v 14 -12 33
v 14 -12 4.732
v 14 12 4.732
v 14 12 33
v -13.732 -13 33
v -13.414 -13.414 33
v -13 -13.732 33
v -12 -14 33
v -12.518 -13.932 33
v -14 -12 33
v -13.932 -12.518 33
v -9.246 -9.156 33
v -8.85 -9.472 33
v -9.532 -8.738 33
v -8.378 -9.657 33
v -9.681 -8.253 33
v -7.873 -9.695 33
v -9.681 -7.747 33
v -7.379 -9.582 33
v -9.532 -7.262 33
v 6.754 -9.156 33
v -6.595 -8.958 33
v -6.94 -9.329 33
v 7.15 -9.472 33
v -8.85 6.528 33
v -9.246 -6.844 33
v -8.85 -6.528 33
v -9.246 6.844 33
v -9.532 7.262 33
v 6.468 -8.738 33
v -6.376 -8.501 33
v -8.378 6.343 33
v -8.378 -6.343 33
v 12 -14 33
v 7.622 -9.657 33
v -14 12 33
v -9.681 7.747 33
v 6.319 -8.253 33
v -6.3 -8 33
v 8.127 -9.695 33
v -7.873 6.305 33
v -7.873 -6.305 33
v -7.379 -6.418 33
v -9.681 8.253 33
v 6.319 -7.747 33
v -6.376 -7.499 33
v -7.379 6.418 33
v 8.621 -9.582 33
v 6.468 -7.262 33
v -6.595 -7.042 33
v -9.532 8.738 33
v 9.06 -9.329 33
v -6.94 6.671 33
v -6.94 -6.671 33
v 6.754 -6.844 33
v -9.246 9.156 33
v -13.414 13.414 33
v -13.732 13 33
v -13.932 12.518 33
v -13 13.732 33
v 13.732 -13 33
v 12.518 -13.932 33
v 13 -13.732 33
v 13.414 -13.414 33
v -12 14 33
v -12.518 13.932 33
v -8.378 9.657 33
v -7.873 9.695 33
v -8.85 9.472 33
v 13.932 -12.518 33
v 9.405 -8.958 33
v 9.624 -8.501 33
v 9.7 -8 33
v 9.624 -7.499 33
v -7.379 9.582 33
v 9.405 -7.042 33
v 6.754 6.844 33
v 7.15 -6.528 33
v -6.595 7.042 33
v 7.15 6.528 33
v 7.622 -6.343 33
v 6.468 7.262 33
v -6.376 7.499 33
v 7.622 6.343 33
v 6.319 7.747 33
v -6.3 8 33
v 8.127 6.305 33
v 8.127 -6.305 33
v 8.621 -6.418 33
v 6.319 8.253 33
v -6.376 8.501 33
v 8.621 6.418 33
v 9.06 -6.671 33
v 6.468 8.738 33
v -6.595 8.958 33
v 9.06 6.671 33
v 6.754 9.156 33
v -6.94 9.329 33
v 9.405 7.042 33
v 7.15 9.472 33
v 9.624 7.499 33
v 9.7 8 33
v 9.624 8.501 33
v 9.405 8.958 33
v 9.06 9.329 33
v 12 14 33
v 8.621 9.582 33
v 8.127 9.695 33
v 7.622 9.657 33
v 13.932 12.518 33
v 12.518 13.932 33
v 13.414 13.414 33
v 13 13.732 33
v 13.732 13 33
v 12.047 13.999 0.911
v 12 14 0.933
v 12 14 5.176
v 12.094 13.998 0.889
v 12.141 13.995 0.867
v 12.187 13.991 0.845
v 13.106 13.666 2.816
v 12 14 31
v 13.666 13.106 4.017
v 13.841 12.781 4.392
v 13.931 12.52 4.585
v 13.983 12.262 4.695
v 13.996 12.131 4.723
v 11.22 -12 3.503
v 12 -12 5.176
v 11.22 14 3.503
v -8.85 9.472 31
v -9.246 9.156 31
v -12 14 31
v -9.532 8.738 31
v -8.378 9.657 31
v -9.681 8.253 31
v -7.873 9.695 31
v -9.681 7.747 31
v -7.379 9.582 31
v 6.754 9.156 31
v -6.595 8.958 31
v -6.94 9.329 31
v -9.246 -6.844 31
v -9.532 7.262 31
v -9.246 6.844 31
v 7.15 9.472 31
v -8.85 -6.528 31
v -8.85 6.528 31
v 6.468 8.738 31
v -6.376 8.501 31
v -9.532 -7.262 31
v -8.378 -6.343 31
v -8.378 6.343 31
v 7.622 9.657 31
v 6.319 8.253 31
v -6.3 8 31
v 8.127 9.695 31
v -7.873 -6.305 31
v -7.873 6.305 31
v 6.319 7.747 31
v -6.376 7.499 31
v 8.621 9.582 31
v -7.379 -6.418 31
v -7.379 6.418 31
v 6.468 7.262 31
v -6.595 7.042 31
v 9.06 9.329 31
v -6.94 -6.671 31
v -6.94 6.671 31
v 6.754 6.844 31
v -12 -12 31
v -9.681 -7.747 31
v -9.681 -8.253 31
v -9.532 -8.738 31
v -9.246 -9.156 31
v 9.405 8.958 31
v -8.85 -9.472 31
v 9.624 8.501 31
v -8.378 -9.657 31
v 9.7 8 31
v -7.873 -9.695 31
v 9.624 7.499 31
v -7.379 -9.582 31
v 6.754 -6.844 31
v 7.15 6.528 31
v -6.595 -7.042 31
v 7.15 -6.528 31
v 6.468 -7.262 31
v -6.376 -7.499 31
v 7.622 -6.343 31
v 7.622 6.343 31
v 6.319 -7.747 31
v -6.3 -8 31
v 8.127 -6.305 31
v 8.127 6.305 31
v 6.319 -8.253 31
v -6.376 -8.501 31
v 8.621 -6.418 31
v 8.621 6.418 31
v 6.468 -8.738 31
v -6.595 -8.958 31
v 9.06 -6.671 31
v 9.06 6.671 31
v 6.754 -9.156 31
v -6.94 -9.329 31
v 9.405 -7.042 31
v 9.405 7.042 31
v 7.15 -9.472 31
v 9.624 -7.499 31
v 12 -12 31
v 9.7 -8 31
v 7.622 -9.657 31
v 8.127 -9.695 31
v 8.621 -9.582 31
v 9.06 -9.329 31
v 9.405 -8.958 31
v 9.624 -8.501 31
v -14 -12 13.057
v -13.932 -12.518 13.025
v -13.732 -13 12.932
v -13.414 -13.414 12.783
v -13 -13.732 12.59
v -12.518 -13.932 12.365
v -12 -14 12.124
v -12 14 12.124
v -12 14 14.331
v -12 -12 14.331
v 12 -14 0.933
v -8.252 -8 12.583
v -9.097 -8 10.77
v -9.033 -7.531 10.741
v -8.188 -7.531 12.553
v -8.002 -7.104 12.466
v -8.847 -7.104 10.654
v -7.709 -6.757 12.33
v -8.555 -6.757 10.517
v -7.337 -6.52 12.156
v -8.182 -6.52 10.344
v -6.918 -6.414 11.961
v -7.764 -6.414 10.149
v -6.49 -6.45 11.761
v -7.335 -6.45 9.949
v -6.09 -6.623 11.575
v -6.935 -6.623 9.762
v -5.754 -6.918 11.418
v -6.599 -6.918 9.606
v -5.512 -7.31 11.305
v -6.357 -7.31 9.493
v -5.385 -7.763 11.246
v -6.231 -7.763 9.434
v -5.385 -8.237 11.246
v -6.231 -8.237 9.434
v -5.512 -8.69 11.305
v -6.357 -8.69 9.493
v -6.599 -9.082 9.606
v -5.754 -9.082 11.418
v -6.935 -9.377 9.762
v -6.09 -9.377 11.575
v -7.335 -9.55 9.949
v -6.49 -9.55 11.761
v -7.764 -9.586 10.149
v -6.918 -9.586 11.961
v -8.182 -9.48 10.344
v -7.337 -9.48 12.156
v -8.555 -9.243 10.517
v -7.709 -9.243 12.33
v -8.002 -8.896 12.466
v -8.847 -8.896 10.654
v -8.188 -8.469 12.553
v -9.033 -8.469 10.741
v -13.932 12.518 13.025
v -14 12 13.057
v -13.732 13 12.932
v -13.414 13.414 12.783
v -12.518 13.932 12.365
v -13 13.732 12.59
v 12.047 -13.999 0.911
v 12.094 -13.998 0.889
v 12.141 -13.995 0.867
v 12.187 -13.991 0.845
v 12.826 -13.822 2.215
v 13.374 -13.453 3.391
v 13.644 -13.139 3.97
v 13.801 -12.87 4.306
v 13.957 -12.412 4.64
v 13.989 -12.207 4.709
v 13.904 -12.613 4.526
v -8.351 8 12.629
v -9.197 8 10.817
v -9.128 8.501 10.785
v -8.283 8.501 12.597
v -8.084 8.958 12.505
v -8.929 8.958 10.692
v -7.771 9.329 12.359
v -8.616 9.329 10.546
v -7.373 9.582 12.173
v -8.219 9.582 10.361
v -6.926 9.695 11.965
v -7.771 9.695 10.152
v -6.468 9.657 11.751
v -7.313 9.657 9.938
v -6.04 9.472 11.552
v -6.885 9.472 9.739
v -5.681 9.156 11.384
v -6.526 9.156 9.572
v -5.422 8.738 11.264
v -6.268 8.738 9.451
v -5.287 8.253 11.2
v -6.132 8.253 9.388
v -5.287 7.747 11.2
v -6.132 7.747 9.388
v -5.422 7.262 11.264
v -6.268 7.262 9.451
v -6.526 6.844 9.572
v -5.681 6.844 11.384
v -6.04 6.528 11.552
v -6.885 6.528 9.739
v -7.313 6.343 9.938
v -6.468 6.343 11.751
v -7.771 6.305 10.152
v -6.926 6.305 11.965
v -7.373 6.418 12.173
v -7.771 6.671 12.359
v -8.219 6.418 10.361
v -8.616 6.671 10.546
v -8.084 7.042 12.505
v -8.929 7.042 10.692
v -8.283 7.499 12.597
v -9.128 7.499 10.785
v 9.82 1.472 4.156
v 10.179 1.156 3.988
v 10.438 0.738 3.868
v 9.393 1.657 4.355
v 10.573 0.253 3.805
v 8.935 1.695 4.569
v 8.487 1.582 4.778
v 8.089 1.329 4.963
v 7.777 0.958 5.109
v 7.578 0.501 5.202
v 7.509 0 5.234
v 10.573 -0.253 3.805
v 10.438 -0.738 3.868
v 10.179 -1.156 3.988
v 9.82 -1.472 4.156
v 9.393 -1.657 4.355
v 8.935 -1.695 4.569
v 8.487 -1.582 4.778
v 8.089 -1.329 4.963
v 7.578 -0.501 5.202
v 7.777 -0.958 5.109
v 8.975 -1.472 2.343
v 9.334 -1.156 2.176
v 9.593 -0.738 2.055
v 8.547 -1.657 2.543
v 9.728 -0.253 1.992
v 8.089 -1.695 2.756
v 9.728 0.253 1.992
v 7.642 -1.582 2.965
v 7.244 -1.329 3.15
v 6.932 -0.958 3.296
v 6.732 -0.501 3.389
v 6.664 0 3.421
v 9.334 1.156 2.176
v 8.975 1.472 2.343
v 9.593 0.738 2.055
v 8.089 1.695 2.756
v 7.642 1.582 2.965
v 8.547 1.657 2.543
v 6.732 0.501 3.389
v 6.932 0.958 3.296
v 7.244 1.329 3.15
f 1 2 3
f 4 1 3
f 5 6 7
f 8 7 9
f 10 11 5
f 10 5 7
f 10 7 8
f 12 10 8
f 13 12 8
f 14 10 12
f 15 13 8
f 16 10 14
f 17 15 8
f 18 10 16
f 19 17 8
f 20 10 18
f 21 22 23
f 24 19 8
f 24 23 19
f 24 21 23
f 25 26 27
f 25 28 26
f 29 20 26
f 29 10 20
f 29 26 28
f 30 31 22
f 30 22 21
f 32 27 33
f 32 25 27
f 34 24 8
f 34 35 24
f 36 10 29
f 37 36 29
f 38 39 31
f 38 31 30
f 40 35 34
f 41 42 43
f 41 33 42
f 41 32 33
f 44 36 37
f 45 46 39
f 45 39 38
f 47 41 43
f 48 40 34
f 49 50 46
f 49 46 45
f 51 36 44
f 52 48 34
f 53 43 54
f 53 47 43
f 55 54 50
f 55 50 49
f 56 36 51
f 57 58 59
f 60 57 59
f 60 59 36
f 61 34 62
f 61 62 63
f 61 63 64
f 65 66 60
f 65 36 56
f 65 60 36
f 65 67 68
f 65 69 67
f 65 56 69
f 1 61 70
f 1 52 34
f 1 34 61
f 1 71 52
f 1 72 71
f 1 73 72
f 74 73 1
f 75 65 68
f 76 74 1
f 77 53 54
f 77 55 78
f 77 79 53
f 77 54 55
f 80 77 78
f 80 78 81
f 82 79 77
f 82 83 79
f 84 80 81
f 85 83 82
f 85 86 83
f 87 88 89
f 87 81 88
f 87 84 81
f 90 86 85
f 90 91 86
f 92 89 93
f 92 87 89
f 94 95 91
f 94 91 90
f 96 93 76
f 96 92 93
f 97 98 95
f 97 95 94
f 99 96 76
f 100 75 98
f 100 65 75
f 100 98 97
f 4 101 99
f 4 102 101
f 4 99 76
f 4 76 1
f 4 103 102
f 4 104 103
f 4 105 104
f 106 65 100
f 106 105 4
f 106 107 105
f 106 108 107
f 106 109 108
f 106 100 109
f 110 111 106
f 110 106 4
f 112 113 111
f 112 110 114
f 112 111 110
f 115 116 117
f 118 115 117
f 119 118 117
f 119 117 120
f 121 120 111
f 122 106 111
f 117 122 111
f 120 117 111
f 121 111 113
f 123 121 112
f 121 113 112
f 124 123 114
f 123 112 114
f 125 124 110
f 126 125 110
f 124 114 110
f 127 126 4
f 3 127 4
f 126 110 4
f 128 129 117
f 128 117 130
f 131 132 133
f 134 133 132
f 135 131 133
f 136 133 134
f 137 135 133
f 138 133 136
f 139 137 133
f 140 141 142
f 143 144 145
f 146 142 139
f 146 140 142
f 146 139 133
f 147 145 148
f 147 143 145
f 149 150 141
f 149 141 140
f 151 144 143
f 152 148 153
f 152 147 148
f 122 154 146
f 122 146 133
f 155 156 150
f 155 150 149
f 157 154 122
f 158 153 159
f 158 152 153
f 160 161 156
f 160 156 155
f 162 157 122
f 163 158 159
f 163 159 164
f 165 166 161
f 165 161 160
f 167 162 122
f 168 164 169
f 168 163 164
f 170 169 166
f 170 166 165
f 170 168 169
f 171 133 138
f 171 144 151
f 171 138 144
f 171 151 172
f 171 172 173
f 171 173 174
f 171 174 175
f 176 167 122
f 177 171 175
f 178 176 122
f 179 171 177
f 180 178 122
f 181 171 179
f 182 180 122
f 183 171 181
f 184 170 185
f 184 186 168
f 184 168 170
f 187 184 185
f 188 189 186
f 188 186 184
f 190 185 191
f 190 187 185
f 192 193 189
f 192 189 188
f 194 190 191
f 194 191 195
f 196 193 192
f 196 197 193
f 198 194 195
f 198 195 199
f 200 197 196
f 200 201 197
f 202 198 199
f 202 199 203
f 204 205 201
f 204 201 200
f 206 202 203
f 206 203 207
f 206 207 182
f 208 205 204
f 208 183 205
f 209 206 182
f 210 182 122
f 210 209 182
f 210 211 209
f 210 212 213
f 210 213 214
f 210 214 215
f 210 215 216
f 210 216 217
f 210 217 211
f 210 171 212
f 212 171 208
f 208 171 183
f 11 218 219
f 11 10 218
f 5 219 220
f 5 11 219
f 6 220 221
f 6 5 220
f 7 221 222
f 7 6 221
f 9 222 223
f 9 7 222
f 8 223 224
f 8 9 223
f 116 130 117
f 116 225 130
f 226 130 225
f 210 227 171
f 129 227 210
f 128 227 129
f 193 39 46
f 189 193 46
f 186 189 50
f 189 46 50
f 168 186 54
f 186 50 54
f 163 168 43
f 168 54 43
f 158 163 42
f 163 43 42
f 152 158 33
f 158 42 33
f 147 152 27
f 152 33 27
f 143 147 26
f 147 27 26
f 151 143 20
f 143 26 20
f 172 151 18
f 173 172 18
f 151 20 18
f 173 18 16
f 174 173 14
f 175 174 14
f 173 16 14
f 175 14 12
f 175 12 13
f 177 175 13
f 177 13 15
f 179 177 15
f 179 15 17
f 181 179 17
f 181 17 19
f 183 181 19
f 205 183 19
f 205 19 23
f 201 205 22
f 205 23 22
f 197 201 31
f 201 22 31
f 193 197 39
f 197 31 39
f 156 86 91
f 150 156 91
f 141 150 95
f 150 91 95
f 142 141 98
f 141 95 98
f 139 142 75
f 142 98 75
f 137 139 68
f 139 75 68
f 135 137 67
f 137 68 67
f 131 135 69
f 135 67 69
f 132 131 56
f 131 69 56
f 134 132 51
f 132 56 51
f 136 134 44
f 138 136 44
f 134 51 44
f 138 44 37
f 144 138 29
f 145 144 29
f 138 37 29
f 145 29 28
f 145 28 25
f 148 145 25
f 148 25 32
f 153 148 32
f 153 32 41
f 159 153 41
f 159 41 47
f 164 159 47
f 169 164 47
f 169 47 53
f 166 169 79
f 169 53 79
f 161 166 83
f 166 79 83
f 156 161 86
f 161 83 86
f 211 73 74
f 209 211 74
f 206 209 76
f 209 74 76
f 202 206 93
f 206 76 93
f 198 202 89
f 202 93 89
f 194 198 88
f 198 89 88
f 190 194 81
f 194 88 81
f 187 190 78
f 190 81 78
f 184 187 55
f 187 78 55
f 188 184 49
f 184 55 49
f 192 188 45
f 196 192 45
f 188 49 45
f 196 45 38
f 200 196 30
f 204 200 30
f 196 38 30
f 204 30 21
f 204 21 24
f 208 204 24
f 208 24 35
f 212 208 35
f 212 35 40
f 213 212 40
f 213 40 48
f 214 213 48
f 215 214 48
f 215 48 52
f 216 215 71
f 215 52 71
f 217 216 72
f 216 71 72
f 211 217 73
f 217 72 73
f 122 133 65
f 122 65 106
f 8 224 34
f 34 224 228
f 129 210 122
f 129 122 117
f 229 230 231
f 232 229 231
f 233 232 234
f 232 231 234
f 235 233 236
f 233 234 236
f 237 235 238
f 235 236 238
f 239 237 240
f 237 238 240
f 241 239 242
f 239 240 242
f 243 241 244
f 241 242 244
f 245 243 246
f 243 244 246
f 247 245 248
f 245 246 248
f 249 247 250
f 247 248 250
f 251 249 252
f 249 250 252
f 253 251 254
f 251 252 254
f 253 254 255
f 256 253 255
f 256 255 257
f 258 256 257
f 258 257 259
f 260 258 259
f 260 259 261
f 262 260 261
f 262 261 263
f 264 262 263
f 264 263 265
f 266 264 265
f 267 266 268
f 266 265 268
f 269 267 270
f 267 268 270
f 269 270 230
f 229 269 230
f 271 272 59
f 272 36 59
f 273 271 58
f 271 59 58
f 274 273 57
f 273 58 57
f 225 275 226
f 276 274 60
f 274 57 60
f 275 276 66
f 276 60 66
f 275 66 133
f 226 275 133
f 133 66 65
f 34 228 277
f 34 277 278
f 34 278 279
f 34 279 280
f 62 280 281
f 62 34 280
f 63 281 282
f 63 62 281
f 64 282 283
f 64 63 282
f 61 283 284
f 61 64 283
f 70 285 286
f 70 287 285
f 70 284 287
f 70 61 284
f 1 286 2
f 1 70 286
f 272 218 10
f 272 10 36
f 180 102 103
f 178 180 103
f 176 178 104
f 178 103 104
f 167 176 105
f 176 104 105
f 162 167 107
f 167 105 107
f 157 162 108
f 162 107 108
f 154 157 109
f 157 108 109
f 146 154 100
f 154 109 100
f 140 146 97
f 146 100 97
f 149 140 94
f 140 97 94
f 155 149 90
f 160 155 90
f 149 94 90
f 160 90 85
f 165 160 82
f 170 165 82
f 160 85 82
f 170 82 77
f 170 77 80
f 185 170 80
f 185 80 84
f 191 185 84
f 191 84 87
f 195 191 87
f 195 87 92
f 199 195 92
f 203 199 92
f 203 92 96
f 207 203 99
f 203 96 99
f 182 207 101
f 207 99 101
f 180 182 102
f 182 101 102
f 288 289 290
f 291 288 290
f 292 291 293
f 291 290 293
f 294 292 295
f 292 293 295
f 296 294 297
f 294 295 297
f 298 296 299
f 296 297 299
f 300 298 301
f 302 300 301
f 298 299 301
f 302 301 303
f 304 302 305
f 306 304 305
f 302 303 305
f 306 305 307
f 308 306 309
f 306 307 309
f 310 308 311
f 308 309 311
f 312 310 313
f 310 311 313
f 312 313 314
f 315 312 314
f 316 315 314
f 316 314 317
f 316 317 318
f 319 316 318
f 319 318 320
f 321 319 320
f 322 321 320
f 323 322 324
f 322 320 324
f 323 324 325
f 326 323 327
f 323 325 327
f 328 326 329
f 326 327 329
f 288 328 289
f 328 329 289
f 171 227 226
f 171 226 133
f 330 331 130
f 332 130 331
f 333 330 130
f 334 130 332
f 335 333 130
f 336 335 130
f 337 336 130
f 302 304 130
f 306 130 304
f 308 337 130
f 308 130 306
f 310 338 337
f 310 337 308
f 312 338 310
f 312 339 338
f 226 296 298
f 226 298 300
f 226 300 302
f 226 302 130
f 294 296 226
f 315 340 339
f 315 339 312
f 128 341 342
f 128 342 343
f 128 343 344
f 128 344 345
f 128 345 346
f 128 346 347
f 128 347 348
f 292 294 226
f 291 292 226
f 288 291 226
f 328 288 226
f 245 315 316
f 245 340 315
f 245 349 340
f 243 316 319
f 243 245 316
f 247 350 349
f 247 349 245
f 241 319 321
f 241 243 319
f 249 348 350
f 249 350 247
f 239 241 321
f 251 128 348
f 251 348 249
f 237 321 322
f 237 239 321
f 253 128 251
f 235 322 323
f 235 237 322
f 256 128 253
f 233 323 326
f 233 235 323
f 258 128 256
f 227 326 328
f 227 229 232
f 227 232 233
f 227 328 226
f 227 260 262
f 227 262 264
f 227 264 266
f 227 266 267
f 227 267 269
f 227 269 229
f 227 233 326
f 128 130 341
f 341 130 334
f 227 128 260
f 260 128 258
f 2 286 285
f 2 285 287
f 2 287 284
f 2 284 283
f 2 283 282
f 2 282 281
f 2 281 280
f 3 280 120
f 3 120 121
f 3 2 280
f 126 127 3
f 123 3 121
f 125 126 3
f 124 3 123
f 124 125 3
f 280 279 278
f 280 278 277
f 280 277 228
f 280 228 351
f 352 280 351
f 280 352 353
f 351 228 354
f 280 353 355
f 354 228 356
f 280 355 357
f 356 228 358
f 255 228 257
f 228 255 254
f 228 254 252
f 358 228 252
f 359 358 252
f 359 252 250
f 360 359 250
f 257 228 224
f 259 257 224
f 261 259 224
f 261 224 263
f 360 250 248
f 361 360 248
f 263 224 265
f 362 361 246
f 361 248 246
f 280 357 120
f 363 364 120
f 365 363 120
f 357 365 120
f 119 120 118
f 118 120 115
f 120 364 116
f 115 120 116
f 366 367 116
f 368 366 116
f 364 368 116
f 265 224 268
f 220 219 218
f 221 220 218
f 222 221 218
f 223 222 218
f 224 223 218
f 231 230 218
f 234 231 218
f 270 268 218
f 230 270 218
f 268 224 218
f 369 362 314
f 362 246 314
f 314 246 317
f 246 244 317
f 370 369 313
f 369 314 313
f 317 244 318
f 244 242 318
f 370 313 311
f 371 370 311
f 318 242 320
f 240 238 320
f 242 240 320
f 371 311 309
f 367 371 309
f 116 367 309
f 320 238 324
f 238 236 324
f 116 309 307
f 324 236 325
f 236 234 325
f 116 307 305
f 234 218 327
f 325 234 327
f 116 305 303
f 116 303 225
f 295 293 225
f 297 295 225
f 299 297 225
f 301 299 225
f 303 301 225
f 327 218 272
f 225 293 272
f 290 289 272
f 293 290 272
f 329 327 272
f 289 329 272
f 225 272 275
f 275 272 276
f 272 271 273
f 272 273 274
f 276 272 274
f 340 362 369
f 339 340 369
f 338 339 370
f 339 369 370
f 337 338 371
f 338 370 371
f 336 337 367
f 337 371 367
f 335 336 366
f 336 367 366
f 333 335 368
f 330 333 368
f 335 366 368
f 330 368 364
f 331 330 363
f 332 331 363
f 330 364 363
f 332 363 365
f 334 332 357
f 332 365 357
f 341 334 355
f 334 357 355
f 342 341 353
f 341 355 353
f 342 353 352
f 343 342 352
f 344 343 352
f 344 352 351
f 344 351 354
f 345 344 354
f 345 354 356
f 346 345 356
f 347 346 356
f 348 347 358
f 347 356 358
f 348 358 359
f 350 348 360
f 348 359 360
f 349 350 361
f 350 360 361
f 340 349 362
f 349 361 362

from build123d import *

# Parameters (mm, degrees)
SKETCH1_W           = 28
SKETCH1_H           = 28
BOSS_EXTRUDE1_DEPTH = 33
SKETCH3_W           = 49.200789626
SKETCH3_H           = 42.103599699
CUT_EXTRUDE1_DEPTH  = 15
FILLET1_R           = 2
SKETCH7_W           = 35.932527634
SKETCH7_H           = 14.196879105
CUT_EXTRUDE3_DEPTH  = 2
SHELL1_START        = -12
SHELL1_DEPTH        = 26
SKETCH8_R           = 1.7
CUT_EXTRUDE4_DEPTH  = 2
SKETCH9_R           = 1.590347025
SKETCH9_R_2         = 1.7
CUT_EXTRUDE5_DEPTH  = 2


# Read off the part's stored shape, not the designer's step: Shell1
with BuildPart() as part:
    # Sketch1 → Boss-Extrude1 (new body)
    with BuildSketch(Plane.XY):
        Rectangle(SKETCH1_W, SKETCH1_H)
    extrude(amount=BOSS_EXTRUDE1_DEPTH)

    # Sketch3 → Cut-Extrude1 (cut)
    with BuildSketch(Plane(origin=(2.500486732, 0, 5.362311102), x_dir=(0, 1, 0), z_dir=(0.4226182617407003, 0, 0.9063077870366496))):
        with Locations((-1.181385954, 1.948035585)):
            Rectangle(SKETCH3_W, SKETCH3_H)
    extrude(amount=-CUT_EXTRUDE1_DEPTH, mode=Mode.SUBTRACT)

    # Fillet1
    fillet1_edges = [part.edges().sort_by_distance(p)[0] for p in [
        (14, -14, 16.5),
        (-14, -14, 23.028307214),
        (-14, 14, 23.028307214),
        (14, 14, 16.5),
    ]]
    fillet(fillet1_edges, radius=FILLET1_R)

    # Sketch7 → Cut-Extrude3 (cut)
    with BuildSketch(Plane(origin=(11.499513268, 0, -5.362311102), x_dir=(0, 1, 0), z_dir=(0.9063077870366496, 0, -0.4226182617407003))):
        with Locations((0.607628843, 7.098439553)):
            Rectangle(SKETCH7_W, SKETCH7_H)
    extrude(amount=-CUT_EXTRUDE3_DEPTH, mode=Mode.SUBTRACT)

    # Shell1 outline → Shell1 (cut)
    with BuildSketch(Plane(origin=(0, 0, 0), x_dir=(1, 0, 0), z_dir=(0, 1, 0)).offset(SHELL1_START)):
        Polygon((12, -31), (12, -5.175792492), (11.220005375, -3.503088621), (-12, -14.33075495), (-12, -31), align=None)
    extrude(amount=SHELL1_DEPTH, mode=Mode.SUBTRACT)

    # Sketch8 → Cut-Extrude4 (cut)
    with BuildSketch(Plane.XY.offset(33)):
        with Locations((-8, 8)):
            Circle(SKETCH8_R)
        with Locations((8, 8)):
            Circle(SKETCH8_R)
        with Locations((8, -8)):
            Circle(SKETCH8_R)
        with Locations((-8, -8)):
            Circle(SKETCH8_R)
    extrude(amount=-CUT_EXTRUDE4_DEPTH, mode=Mode.SUBTRACT)

    # Sketch9 → Cut-Extrude5 (cut)
    with BuildSketch(Plane(origin=(2.500486732, 0, 5.362311102), x_dir=(-0.9063077870366496, 0, 0.4226182617407002), z_dir=(-0.4226182617407003, 0, -0.9063077870366497))):
        with Locations((11.206272712, -8)):
            Circle(SKETCH9_R)
        with Locations((11.206272712, 8)):
            Circle(SKETCH9_R_2)
        with Locations((-6.293727288, 0)):
            Circle(SKETCH9_R_2)
    extrude(amount=-CUT_EXTRUDE5_DEPTH, mode=Mode.SUBTRACT)


solid = part.part
